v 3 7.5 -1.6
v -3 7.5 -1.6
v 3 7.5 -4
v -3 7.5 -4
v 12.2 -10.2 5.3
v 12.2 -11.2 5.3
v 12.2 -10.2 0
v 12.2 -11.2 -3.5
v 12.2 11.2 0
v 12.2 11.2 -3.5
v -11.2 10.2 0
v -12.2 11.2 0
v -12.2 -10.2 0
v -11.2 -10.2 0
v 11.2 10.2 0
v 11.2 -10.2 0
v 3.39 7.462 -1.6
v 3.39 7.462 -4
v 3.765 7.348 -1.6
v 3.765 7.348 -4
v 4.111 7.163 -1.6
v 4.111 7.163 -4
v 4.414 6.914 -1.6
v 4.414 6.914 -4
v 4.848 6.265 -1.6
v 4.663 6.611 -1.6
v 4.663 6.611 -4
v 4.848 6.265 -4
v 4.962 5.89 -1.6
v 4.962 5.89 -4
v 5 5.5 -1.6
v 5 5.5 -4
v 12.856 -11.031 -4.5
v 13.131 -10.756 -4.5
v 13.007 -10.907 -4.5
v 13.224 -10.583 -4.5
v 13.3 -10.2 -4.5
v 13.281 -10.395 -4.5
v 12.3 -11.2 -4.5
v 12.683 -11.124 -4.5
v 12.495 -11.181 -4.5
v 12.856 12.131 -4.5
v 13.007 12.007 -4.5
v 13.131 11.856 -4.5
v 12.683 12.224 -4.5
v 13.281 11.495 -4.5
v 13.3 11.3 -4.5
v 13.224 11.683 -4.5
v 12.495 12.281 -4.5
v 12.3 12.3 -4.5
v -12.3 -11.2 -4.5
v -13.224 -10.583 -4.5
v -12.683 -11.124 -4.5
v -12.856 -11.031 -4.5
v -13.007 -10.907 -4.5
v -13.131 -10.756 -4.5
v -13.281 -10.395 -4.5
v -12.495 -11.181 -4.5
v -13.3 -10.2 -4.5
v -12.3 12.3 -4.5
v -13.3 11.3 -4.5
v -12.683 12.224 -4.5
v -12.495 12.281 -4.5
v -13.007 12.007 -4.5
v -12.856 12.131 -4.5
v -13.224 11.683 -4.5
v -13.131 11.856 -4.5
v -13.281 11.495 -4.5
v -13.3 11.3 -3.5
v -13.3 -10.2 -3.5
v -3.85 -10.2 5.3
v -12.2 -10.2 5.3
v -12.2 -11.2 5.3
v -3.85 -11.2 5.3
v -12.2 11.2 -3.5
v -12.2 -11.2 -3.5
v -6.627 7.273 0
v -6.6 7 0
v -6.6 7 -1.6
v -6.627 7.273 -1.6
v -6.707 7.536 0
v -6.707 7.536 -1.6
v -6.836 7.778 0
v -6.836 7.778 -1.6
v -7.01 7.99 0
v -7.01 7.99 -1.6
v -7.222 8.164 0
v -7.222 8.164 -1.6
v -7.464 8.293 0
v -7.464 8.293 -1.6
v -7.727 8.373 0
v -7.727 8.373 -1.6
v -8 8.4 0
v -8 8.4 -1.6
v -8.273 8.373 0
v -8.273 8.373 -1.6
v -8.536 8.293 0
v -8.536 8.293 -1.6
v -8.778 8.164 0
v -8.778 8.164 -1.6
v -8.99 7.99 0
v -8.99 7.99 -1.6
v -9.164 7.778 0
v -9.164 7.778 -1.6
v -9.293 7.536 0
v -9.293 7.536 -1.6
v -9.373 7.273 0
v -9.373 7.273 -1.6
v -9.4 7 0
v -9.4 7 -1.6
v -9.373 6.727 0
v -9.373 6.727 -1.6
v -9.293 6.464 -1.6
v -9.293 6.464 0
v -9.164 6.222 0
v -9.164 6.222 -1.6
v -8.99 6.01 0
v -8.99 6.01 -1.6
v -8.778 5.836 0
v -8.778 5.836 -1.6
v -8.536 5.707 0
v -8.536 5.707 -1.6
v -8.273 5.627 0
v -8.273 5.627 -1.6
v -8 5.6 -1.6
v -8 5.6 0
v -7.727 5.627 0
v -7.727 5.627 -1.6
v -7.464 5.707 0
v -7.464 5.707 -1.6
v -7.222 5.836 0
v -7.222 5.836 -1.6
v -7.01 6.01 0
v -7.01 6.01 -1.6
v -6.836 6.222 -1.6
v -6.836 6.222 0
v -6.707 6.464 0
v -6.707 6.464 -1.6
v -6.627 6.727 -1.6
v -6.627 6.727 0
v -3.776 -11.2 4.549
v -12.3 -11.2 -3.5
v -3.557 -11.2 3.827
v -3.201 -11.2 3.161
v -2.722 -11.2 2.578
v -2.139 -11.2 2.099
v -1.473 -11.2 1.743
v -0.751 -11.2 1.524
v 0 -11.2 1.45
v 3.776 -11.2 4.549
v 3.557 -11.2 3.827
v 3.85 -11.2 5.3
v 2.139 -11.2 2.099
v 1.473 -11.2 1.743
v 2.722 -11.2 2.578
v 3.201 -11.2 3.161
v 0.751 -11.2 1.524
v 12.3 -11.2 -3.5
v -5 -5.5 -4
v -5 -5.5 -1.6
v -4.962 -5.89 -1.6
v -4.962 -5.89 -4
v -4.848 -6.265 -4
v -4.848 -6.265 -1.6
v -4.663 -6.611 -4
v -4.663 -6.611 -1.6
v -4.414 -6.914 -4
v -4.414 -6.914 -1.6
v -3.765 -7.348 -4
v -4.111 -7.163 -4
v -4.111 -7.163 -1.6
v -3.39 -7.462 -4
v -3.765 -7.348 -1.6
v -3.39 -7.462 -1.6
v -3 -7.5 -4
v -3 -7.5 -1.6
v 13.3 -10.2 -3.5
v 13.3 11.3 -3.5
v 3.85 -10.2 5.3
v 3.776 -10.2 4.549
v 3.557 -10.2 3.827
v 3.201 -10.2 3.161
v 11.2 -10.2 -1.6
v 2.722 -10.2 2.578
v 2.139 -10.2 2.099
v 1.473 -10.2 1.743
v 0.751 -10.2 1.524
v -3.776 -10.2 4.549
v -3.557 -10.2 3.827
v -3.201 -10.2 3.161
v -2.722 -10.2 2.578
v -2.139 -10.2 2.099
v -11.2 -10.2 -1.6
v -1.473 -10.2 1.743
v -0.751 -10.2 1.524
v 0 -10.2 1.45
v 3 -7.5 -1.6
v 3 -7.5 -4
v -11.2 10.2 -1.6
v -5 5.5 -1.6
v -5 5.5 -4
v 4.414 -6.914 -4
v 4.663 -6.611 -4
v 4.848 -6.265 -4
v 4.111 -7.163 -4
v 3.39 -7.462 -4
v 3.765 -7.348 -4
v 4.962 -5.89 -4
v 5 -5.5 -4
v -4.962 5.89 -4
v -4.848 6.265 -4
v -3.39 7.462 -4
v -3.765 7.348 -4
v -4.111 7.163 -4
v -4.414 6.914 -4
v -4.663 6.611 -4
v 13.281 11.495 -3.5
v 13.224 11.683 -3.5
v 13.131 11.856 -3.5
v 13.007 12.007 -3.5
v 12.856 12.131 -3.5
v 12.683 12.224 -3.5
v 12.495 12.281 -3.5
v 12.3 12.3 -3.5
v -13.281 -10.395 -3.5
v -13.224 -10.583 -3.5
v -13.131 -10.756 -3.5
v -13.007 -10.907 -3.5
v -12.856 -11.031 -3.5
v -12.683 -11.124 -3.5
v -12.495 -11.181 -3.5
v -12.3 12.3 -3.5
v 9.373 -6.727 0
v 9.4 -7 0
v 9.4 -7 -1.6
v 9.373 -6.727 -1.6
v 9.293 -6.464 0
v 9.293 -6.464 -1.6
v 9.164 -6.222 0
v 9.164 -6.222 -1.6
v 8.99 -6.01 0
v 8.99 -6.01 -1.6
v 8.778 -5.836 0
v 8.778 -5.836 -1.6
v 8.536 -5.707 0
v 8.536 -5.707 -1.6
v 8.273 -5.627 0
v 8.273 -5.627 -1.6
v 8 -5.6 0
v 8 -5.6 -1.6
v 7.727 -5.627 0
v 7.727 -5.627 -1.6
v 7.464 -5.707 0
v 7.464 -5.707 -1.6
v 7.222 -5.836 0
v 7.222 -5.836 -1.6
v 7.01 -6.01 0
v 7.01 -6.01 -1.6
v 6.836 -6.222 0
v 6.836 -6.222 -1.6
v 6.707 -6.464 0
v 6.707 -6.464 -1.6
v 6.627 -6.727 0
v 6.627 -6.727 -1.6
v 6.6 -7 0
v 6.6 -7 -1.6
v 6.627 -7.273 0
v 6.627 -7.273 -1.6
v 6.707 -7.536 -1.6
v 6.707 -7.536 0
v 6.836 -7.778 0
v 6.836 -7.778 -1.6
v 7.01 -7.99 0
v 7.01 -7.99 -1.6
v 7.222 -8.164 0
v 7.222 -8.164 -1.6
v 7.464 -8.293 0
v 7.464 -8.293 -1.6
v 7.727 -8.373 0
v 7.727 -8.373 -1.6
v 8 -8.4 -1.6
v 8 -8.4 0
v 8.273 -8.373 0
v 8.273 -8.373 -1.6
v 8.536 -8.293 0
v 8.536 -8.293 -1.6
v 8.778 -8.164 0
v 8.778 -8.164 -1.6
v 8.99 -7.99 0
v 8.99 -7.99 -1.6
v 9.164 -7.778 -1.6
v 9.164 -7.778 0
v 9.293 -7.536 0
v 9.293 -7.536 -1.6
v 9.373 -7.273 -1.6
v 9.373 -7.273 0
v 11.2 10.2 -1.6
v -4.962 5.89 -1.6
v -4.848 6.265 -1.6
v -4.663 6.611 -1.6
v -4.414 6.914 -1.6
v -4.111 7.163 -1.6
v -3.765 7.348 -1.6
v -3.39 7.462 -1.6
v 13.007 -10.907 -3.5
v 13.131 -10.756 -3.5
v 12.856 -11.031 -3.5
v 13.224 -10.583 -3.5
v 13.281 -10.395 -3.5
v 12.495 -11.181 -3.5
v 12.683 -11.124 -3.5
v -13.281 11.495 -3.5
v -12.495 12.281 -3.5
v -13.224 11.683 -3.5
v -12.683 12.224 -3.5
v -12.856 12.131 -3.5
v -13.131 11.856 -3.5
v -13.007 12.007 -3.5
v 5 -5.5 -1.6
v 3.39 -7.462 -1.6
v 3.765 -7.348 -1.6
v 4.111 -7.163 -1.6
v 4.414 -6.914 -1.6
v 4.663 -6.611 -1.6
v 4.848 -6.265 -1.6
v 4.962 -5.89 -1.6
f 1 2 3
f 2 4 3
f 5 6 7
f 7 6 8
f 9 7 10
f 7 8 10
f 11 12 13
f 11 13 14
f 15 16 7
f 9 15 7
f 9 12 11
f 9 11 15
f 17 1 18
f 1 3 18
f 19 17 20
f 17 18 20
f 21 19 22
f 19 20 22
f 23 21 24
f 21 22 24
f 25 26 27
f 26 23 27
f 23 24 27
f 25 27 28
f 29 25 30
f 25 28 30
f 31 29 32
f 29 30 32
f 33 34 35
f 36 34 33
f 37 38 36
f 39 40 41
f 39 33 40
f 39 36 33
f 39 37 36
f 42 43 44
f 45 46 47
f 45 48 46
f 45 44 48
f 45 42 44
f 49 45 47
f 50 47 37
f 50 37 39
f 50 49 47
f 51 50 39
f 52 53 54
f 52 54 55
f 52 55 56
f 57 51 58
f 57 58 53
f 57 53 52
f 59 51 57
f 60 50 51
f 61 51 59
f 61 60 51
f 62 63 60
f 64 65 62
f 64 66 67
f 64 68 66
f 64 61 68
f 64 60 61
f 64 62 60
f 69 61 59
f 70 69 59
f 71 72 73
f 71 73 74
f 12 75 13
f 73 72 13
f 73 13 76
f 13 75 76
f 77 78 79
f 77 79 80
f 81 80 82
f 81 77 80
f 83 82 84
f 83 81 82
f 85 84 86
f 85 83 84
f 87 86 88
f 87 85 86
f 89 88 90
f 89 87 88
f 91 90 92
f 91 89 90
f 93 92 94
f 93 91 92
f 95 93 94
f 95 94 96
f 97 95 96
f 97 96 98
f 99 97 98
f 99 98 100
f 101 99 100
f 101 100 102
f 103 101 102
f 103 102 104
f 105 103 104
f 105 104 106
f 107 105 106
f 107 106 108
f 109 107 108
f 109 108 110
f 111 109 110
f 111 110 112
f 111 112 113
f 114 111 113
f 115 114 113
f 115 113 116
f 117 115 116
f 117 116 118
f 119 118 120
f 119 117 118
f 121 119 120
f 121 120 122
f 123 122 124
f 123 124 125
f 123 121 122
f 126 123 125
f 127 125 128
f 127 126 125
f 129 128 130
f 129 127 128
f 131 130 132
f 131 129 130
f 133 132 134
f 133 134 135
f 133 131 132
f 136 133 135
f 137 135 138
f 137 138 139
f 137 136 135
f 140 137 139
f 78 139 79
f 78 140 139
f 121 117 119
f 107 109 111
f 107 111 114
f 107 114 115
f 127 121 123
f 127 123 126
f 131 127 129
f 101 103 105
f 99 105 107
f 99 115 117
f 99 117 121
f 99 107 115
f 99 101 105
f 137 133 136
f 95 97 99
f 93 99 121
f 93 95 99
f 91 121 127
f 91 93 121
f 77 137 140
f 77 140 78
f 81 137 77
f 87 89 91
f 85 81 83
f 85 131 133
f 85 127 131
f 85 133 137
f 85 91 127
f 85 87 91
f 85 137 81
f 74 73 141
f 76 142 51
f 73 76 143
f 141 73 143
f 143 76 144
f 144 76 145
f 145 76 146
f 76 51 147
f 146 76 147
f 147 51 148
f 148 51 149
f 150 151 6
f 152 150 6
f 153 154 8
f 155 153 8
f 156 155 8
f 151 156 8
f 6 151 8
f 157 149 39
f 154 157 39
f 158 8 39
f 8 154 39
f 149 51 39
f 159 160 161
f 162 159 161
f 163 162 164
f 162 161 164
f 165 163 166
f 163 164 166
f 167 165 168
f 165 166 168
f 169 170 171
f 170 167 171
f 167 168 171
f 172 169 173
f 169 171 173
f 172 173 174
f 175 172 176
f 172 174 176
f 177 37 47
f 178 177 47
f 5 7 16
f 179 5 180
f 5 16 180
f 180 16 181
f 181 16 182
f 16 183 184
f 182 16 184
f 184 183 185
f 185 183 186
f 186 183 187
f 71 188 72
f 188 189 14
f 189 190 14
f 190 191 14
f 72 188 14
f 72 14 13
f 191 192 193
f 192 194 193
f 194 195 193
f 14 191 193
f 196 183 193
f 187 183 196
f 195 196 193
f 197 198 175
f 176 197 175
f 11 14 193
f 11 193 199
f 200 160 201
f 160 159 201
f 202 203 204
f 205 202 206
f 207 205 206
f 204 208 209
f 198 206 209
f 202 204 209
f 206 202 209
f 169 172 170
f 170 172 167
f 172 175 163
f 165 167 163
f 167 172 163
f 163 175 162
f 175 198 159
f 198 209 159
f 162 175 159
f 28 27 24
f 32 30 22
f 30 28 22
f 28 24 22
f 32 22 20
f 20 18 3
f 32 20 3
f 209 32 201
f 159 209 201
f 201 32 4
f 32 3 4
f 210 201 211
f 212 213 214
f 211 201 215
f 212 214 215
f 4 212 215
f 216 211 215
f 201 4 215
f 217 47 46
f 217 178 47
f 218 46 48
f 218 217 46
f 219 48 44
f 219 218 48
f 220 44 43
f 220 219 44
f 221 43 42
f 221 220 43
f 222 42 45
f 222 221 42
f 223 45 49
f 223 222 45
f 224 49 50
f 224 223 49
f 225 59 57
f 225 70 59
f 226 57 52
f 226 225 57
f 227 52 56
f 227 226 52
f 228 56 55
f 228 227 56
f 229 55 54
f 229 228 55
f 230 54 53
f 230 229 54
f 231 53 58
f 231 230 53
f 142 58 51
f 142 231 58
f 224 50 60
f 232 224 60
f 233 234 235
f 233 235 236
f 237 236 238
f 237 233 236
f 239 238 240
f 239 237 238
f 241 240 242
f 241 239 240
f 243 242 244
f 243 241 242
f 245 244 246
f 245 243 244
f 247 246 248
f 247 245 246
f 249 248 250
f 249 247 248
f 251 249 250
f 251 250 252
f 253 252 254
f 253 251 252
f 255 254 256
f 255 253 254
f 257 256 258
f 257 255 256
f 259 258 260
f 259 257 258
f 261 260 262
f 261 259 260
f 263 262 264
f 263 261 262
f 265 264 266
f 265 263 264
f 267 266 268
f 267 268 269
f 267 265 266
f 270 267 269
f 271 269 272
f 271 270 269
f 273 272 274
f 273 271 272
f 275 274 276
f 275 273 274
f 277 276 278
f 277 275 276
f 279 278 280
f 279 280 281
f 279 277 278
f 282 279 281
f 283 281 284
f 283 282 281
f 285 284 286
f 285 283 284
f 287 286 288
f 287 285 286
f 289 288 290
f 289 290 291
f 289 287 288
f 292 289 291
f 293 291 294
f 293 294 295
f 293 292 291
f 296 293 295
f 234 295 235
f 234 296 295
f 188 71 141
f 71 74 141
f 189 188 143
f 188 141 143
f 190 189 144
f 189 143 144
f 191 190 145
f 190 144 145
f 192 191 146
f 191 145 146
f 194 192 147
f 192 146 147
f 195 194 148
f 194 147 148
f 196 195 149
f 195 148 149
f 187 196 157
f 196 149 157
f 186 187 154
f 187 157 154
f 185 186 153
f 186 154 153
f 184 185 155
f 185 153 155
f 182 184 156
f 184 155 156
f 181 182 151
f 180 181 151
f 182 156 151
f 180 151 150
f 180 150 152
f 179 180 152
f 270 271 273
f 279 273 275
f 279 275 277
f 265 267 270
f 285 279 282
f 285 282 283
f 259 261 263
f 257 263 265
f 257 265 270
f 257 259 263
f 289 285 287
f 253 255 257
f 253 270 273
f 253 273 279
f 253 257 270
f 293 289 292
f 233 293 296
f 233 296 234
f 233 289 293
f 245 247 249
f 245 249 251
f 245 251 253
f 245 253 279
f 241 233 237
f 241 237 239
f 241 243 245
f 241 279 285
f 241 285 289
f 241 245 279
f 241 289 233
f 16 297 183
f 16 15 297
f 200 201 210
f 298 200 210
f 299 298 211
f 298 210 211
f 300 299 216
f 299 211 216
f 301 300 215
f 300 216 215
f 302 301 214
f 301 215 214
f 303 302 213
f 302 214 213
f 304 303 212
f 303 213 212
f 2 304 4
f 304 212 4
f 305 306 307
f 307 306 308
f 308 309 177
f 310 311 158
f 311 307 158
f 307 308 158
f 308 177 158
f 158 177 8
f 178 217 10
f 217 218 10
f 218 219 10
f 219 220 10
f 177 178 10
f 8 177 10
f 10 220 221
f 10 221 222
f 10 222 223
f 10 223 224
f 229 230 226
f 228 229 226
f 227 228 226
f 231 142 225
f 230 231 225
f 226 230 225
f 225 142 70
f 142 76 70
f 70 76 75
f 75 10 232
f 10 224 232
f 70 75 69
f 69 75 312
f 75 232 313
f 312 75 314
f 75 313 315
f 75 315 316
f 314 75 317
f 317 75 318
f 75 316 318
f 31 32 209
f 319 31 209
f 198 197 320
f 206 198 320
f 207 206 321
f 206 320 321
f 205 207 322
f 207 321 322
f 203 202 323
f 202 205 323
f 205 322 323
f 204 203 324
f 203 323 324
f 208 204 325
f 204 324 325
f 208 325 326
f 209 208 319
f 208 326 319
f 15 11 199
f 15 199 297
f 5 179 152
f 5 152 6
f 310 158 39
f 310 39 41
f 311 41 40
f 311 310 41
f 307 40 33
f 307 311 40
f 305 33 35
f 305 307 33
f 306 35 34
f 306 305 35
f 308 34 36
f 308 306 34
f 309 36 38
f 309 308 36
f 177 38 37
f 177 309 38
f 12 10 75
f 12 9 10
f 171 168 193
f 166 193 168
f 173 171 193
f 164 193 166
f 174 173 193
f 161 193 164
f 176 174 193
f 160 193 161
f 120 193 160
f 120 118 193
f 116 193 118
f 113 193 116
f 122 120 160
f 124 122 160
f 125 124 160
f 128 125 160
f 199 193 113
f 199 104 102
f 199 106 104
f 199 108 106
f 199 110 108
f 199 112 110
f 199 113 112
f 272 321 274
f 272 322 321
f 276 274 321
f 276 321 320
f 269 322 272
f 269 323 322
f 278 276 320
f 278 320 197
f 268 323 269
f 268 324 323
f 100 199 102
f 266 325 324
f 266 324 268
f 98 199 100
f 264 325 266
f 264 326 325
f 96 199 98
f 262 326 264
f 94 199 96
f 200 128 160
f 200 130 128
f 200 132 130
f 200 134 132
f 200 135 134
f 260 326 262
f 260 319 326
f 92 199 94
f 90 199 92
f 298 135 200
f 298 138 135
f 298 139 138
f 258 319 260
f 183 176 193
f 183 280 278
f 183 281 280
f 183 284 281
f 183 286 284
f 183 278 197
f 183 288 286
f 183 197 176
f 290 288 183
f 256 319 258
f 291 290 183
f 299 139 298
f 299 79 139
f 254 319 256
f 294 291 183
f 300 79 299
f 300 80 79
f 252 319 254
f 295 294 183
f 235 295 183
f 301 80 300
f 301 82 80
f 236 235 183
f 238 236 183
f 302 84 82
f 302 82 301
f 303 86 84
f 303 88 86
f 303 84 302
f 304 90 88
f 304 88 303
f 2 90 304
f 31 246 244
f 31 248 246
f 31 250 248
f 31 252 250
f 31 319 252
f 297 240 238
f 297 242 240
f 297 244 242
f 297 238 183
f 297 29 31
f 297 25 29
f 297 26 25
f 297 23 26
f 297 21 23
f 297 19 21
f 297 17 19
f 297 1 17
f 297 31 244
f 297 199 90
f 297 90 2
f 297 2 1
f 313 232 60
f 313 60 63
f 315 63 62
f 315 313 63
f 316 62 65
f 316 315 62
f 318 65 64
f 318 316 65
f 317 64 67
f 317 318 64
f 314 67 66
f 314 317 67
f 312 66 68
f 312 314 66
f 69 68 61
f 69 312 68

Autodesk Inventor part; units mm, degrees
ref_plane "YZ Plane" through (0, 0, 0) normal (1, 0, 0) x (0, 1, 0)
ref_plane "XZ Plane" through (0, 0, 0) normal (0, 1, 0) x (-1, 0, 0)
ref_plane "XY Plane" through (0, 0, 0) normal (0, 0, 1) x (1, 0, 0)
sketch "Sketch1" plane through (0, 0, 0) normal (0, 0, 1) x (1, 0, 0)
  circle A0 centre (8, -7) radius 1.6 projected
  circle A1 centre (-8, 7) radius 1.6 projected
  circle A2 centre (-2.5, 4.7) radius 0.8 projected
  circle A3 centre (2.5001, 4.7) radius 0.8 projected
  line L0 (-11, 10) -> (-11, -10) projected
  line L1 (-11, -10) -> (11, -10) projected
  line L2 (11, -10) -> (11, 10) projected
  line L3 (11, 10) -> (-11, 10) projected
  line L4 (-11.2, -10.2) -> (-11.2, 10.2)
  line L5 (-11.2, 10.2) -> (11.2, 10.2)
  line L6 (11.2, 10.2) -> (11.2, -10.2)
  line L7 (11.2, -10.2) -> (-11.2, -10.2)
  circle A4 centre (-8, 7) radius 1.4
  circle A5 centre (8, -7) radius 1.4
  line L8 (-12.2, 11.2) -> (-12.2, -11.2)
  line L9 (-12.2, -11.2) -> (12.2, -11.2)
  line L10 (12.2, -11.2) -> (12.2, 11.2)
  line L11 (12.2, 11.2) -> (-12.2, 11.2)
  circle A6 centre (2.54, -5.9) radius 0.4 projected
  circle A7 centre (-2.54, -5.9) radius 0.4 projected
  circle A8 centre (0, -5.9) radius 0.4 projected
  circle A9 centre (3.5, -7.425) radius 0.5 projected
  circle A10 centre (-3.5, -7.425) radius 0.5 projected
  circle A11 centre (0.6, -3.225) radius 0.3 projected
  circle A12 centre (0.6, -4.425) radius 0.3 projected
  circle A13 centre (-0.6, -3.225) radius 0.3 projected
  circle A14 centre (-0.6, -4.425) radius 0.3 projected
  point P0 (0, 0)
  dimension "d6" = 15
  dimension "d7" = 10
  dimension "d0" = 0.2
  dimension "d1" = 0.2
  dimension "d2" = 0.2
  dimension "d3" = 1
extrude "Extrusion1" add sketch "Sketch1" against normal blind 4 contours A4 | A5 | L11 L10 L9 L8
sketch "Sketch2" plane through (0, 0, -4) normal (0, 0, -1) x (-1, 0, 0)
  line L0 (-12.2, -11.2) -> (12.2, -11.2) projected
  line L1 (12.2, -11.2) -> (12.2, 11.2) projected
  line L2 (12.2, 11.2) -> (-12.2, 11.2) projected
  line L3 (-12.2, 11.2) -> (-12.2, -11.2) projected
  line L4 (11.2, 10.2) -> (11.2, -10.2) projected
  line L5 (11.2, -10.2) -> (-11.2, -10.2) projected
  line L6 (-11.2, -10.2) -> (-11.2, 10.2) projected
  line L7 (-11.2, 10.2) -> (11.2, 10.2) projected
  line L8 (5, -7.5) -> (-5, -7.5)
  line L9 (-5, -7.5) -> (-5, 7.5)
  line L10 (-5, 7.5) -> (5, 7.5)
  line L11 (5, 7.5) -> (5, -7.5)
  point P0 (0, 0)
  point P1 (-5, 0)
  point P2 (0, -7.5)
  point P3 (0, -11.2)
  dimension "d6" = 15
  dimension "d7" = 10
extrude "Extrusion2" add sketch "Sketch2" against normal blind 0.5 contours L4 L5 L6 L7
sketch "Sketch3" plane through (0, 0, -4) normal (0, 0, -1) x (-1, 0, 0)
  line L0 (5, -7.5) -> (-5, -7.5) projected
  line L1 (-5, -7.5) -> (-5, 7.5) projected
  line L2 (-5, 7.5) -> (5, 7.5) projected
  line L3 (5, 7.5) -> (5, -7.5) projected
  line L4 (-12.2, -11.2) -> (12.2, -11.2) projected
  line L5 (12.2, -11.2) -> (12.2, 11.2) projected
  line L6 (12.2, 11.2) -> (-12.2, 11.2) projected
  line L7 (-12.2, 11.2) -> (-12.2, -11.2) projected
  point P0 (0, 0)
extrude "Extrusion3" add sketch "Sketch3" along normal blind 0.5 contours L0 L1 L2 L3 | L7 L6 L5 L4
sketch "Sketch4" plane through (0, 0, 0) normal (0, 0, 1) x (1, 0, 0)
  line L0 (-12.2, -11.2) -> (12.2, -11.2) projected
  line L1 (12.2, -11.2) -> (12.2, 11.2) projected
  line L2 (12.2, 11.2) -> (-12.2, 11.2) projected
  line L3 (-12.2, 11.2) -> (-12.2, -11.2) projected
  line L4 (-11.2, -10.2) -> (-11.2, 10.2) projected
  line L5 (-11.2, 10.2) -> (11.2, 10.2) projected
  line L6 (11.2, 10.2) -> (11.2, -10.2) projected
  line L7 (11.2, -10.2) -> (-11.2, -10.2) projected
  line L8 (-11.2, -10.2) -> (-12.2, -10.2)
  line L9 (11.2, -10.2) -> (-11.2, -10.2) projected
  line L10 (11.2, -10.2) -> (12.2, -10.2)
  point P0 (0, 0)
extrude "Extrusion4" add sketch "Sketch4" along normal blind 5.3 contours L3 L8 L7 L10 L1 L0
sketch "Sketch5" plane through (-12.2, -11.2, -4.5) normal (0, -1, 0) x (1, 0, 0)
  line L0 (23.4, 9.8) -> (0, 9.8) projected
  circle A0 centre (12.2, 9.8) radius 3.85
  point P0 (12.2, 4.5)
  point P1 (8.35, 9.8)
  point P2 (16.05, 9.8)
  dimension "d14" = 7.7
extrude "Extrusion5" cut sketch "Sketch5" against normal blind 5.3 contours A0 L0 picked at (11.471, 8.7438)
sketch "Sketch6" plane through (0, 0, -4.5) normal (0, 0, -1) x (-1, 0, 0)
  line L0 (12.2, -11.2) -> (12.2, 11.2) projected
  line L1 (12.2, 11.2) -> (-12.2, 11.2) projected
  line L2 (-12.2, 11.2) -> (-12.2, -11.2) projected
  line L3 (-12.2, -11.2) -> (12.2, -11.2) projected
  line L4 (13.3, 12.3) -> (13.3, -12.3)
  line L5 (13.3, -12.3) -> (-13.3, -12.3)
  line L6 (-13.3, -12.3) -> (-13.3, 12.3)
  line L7 (-13.3, 12.3) -> (13.3, 12.3)
  line L8 (12.2, -11.2) -> (13.3, -11.2)
  line L9 (-12.2, -11.2) -> (-13.3, -11.2)
  point P0 (0, 0)
  dimension "d17" = 1.1
extrude "Extrusion6" add sketch "Sketch6" against normal blind 1 contours L0 L1 L2 L9 L6 L7 L4 L8
sketch "Sketch7" plane through (0, 0, -3.5) normal (0, 0, 1) x (1, 0, 0)
  circle A0 centre (8, -7) radius 1.4 projected
  circle A1 centre (-8, 7) radius 1.4 projected
  line L0 (11.2, 10.2) -> (11.2, -10.2) projected
  line L1 (-11.2, 10.2) -> (11.2, 10.2) projected
  line L2 (-11.2, -10.2) -> (-11.2, 10.2) projected
  line L3 (11.2, -10.2) -> (-11.2, -10.2) projected
  line L4 (5, -7.5) -> (-5, -7.5) projected
  line L5 (-5, -7.5) -> (-5, 7.5) projected
  line L6 (-5, 7.5) -> (5, 7.5) projected
  line L7 (5, 7.5) -> (5, -7.5) projected
  point P0 (0, 0)
extrude "Extrusion7" add sketch "Sketch7" along normal blind 1.9
fillet "Fillet1" radius 2 4 edges at (-5, 7.5, -2.8) (5, 7.5, -2.8) (-5, -7.5, -2.8) (5, -7.5, -2.8)
fillet "Fillet2" radius 1 4 edges at (13.3, 12.3, -4) (13.3, -11.2, -4) (-13.3, -11.2, -4) (-13.3, 12.3, -4)
properties part number "buttom cover"
